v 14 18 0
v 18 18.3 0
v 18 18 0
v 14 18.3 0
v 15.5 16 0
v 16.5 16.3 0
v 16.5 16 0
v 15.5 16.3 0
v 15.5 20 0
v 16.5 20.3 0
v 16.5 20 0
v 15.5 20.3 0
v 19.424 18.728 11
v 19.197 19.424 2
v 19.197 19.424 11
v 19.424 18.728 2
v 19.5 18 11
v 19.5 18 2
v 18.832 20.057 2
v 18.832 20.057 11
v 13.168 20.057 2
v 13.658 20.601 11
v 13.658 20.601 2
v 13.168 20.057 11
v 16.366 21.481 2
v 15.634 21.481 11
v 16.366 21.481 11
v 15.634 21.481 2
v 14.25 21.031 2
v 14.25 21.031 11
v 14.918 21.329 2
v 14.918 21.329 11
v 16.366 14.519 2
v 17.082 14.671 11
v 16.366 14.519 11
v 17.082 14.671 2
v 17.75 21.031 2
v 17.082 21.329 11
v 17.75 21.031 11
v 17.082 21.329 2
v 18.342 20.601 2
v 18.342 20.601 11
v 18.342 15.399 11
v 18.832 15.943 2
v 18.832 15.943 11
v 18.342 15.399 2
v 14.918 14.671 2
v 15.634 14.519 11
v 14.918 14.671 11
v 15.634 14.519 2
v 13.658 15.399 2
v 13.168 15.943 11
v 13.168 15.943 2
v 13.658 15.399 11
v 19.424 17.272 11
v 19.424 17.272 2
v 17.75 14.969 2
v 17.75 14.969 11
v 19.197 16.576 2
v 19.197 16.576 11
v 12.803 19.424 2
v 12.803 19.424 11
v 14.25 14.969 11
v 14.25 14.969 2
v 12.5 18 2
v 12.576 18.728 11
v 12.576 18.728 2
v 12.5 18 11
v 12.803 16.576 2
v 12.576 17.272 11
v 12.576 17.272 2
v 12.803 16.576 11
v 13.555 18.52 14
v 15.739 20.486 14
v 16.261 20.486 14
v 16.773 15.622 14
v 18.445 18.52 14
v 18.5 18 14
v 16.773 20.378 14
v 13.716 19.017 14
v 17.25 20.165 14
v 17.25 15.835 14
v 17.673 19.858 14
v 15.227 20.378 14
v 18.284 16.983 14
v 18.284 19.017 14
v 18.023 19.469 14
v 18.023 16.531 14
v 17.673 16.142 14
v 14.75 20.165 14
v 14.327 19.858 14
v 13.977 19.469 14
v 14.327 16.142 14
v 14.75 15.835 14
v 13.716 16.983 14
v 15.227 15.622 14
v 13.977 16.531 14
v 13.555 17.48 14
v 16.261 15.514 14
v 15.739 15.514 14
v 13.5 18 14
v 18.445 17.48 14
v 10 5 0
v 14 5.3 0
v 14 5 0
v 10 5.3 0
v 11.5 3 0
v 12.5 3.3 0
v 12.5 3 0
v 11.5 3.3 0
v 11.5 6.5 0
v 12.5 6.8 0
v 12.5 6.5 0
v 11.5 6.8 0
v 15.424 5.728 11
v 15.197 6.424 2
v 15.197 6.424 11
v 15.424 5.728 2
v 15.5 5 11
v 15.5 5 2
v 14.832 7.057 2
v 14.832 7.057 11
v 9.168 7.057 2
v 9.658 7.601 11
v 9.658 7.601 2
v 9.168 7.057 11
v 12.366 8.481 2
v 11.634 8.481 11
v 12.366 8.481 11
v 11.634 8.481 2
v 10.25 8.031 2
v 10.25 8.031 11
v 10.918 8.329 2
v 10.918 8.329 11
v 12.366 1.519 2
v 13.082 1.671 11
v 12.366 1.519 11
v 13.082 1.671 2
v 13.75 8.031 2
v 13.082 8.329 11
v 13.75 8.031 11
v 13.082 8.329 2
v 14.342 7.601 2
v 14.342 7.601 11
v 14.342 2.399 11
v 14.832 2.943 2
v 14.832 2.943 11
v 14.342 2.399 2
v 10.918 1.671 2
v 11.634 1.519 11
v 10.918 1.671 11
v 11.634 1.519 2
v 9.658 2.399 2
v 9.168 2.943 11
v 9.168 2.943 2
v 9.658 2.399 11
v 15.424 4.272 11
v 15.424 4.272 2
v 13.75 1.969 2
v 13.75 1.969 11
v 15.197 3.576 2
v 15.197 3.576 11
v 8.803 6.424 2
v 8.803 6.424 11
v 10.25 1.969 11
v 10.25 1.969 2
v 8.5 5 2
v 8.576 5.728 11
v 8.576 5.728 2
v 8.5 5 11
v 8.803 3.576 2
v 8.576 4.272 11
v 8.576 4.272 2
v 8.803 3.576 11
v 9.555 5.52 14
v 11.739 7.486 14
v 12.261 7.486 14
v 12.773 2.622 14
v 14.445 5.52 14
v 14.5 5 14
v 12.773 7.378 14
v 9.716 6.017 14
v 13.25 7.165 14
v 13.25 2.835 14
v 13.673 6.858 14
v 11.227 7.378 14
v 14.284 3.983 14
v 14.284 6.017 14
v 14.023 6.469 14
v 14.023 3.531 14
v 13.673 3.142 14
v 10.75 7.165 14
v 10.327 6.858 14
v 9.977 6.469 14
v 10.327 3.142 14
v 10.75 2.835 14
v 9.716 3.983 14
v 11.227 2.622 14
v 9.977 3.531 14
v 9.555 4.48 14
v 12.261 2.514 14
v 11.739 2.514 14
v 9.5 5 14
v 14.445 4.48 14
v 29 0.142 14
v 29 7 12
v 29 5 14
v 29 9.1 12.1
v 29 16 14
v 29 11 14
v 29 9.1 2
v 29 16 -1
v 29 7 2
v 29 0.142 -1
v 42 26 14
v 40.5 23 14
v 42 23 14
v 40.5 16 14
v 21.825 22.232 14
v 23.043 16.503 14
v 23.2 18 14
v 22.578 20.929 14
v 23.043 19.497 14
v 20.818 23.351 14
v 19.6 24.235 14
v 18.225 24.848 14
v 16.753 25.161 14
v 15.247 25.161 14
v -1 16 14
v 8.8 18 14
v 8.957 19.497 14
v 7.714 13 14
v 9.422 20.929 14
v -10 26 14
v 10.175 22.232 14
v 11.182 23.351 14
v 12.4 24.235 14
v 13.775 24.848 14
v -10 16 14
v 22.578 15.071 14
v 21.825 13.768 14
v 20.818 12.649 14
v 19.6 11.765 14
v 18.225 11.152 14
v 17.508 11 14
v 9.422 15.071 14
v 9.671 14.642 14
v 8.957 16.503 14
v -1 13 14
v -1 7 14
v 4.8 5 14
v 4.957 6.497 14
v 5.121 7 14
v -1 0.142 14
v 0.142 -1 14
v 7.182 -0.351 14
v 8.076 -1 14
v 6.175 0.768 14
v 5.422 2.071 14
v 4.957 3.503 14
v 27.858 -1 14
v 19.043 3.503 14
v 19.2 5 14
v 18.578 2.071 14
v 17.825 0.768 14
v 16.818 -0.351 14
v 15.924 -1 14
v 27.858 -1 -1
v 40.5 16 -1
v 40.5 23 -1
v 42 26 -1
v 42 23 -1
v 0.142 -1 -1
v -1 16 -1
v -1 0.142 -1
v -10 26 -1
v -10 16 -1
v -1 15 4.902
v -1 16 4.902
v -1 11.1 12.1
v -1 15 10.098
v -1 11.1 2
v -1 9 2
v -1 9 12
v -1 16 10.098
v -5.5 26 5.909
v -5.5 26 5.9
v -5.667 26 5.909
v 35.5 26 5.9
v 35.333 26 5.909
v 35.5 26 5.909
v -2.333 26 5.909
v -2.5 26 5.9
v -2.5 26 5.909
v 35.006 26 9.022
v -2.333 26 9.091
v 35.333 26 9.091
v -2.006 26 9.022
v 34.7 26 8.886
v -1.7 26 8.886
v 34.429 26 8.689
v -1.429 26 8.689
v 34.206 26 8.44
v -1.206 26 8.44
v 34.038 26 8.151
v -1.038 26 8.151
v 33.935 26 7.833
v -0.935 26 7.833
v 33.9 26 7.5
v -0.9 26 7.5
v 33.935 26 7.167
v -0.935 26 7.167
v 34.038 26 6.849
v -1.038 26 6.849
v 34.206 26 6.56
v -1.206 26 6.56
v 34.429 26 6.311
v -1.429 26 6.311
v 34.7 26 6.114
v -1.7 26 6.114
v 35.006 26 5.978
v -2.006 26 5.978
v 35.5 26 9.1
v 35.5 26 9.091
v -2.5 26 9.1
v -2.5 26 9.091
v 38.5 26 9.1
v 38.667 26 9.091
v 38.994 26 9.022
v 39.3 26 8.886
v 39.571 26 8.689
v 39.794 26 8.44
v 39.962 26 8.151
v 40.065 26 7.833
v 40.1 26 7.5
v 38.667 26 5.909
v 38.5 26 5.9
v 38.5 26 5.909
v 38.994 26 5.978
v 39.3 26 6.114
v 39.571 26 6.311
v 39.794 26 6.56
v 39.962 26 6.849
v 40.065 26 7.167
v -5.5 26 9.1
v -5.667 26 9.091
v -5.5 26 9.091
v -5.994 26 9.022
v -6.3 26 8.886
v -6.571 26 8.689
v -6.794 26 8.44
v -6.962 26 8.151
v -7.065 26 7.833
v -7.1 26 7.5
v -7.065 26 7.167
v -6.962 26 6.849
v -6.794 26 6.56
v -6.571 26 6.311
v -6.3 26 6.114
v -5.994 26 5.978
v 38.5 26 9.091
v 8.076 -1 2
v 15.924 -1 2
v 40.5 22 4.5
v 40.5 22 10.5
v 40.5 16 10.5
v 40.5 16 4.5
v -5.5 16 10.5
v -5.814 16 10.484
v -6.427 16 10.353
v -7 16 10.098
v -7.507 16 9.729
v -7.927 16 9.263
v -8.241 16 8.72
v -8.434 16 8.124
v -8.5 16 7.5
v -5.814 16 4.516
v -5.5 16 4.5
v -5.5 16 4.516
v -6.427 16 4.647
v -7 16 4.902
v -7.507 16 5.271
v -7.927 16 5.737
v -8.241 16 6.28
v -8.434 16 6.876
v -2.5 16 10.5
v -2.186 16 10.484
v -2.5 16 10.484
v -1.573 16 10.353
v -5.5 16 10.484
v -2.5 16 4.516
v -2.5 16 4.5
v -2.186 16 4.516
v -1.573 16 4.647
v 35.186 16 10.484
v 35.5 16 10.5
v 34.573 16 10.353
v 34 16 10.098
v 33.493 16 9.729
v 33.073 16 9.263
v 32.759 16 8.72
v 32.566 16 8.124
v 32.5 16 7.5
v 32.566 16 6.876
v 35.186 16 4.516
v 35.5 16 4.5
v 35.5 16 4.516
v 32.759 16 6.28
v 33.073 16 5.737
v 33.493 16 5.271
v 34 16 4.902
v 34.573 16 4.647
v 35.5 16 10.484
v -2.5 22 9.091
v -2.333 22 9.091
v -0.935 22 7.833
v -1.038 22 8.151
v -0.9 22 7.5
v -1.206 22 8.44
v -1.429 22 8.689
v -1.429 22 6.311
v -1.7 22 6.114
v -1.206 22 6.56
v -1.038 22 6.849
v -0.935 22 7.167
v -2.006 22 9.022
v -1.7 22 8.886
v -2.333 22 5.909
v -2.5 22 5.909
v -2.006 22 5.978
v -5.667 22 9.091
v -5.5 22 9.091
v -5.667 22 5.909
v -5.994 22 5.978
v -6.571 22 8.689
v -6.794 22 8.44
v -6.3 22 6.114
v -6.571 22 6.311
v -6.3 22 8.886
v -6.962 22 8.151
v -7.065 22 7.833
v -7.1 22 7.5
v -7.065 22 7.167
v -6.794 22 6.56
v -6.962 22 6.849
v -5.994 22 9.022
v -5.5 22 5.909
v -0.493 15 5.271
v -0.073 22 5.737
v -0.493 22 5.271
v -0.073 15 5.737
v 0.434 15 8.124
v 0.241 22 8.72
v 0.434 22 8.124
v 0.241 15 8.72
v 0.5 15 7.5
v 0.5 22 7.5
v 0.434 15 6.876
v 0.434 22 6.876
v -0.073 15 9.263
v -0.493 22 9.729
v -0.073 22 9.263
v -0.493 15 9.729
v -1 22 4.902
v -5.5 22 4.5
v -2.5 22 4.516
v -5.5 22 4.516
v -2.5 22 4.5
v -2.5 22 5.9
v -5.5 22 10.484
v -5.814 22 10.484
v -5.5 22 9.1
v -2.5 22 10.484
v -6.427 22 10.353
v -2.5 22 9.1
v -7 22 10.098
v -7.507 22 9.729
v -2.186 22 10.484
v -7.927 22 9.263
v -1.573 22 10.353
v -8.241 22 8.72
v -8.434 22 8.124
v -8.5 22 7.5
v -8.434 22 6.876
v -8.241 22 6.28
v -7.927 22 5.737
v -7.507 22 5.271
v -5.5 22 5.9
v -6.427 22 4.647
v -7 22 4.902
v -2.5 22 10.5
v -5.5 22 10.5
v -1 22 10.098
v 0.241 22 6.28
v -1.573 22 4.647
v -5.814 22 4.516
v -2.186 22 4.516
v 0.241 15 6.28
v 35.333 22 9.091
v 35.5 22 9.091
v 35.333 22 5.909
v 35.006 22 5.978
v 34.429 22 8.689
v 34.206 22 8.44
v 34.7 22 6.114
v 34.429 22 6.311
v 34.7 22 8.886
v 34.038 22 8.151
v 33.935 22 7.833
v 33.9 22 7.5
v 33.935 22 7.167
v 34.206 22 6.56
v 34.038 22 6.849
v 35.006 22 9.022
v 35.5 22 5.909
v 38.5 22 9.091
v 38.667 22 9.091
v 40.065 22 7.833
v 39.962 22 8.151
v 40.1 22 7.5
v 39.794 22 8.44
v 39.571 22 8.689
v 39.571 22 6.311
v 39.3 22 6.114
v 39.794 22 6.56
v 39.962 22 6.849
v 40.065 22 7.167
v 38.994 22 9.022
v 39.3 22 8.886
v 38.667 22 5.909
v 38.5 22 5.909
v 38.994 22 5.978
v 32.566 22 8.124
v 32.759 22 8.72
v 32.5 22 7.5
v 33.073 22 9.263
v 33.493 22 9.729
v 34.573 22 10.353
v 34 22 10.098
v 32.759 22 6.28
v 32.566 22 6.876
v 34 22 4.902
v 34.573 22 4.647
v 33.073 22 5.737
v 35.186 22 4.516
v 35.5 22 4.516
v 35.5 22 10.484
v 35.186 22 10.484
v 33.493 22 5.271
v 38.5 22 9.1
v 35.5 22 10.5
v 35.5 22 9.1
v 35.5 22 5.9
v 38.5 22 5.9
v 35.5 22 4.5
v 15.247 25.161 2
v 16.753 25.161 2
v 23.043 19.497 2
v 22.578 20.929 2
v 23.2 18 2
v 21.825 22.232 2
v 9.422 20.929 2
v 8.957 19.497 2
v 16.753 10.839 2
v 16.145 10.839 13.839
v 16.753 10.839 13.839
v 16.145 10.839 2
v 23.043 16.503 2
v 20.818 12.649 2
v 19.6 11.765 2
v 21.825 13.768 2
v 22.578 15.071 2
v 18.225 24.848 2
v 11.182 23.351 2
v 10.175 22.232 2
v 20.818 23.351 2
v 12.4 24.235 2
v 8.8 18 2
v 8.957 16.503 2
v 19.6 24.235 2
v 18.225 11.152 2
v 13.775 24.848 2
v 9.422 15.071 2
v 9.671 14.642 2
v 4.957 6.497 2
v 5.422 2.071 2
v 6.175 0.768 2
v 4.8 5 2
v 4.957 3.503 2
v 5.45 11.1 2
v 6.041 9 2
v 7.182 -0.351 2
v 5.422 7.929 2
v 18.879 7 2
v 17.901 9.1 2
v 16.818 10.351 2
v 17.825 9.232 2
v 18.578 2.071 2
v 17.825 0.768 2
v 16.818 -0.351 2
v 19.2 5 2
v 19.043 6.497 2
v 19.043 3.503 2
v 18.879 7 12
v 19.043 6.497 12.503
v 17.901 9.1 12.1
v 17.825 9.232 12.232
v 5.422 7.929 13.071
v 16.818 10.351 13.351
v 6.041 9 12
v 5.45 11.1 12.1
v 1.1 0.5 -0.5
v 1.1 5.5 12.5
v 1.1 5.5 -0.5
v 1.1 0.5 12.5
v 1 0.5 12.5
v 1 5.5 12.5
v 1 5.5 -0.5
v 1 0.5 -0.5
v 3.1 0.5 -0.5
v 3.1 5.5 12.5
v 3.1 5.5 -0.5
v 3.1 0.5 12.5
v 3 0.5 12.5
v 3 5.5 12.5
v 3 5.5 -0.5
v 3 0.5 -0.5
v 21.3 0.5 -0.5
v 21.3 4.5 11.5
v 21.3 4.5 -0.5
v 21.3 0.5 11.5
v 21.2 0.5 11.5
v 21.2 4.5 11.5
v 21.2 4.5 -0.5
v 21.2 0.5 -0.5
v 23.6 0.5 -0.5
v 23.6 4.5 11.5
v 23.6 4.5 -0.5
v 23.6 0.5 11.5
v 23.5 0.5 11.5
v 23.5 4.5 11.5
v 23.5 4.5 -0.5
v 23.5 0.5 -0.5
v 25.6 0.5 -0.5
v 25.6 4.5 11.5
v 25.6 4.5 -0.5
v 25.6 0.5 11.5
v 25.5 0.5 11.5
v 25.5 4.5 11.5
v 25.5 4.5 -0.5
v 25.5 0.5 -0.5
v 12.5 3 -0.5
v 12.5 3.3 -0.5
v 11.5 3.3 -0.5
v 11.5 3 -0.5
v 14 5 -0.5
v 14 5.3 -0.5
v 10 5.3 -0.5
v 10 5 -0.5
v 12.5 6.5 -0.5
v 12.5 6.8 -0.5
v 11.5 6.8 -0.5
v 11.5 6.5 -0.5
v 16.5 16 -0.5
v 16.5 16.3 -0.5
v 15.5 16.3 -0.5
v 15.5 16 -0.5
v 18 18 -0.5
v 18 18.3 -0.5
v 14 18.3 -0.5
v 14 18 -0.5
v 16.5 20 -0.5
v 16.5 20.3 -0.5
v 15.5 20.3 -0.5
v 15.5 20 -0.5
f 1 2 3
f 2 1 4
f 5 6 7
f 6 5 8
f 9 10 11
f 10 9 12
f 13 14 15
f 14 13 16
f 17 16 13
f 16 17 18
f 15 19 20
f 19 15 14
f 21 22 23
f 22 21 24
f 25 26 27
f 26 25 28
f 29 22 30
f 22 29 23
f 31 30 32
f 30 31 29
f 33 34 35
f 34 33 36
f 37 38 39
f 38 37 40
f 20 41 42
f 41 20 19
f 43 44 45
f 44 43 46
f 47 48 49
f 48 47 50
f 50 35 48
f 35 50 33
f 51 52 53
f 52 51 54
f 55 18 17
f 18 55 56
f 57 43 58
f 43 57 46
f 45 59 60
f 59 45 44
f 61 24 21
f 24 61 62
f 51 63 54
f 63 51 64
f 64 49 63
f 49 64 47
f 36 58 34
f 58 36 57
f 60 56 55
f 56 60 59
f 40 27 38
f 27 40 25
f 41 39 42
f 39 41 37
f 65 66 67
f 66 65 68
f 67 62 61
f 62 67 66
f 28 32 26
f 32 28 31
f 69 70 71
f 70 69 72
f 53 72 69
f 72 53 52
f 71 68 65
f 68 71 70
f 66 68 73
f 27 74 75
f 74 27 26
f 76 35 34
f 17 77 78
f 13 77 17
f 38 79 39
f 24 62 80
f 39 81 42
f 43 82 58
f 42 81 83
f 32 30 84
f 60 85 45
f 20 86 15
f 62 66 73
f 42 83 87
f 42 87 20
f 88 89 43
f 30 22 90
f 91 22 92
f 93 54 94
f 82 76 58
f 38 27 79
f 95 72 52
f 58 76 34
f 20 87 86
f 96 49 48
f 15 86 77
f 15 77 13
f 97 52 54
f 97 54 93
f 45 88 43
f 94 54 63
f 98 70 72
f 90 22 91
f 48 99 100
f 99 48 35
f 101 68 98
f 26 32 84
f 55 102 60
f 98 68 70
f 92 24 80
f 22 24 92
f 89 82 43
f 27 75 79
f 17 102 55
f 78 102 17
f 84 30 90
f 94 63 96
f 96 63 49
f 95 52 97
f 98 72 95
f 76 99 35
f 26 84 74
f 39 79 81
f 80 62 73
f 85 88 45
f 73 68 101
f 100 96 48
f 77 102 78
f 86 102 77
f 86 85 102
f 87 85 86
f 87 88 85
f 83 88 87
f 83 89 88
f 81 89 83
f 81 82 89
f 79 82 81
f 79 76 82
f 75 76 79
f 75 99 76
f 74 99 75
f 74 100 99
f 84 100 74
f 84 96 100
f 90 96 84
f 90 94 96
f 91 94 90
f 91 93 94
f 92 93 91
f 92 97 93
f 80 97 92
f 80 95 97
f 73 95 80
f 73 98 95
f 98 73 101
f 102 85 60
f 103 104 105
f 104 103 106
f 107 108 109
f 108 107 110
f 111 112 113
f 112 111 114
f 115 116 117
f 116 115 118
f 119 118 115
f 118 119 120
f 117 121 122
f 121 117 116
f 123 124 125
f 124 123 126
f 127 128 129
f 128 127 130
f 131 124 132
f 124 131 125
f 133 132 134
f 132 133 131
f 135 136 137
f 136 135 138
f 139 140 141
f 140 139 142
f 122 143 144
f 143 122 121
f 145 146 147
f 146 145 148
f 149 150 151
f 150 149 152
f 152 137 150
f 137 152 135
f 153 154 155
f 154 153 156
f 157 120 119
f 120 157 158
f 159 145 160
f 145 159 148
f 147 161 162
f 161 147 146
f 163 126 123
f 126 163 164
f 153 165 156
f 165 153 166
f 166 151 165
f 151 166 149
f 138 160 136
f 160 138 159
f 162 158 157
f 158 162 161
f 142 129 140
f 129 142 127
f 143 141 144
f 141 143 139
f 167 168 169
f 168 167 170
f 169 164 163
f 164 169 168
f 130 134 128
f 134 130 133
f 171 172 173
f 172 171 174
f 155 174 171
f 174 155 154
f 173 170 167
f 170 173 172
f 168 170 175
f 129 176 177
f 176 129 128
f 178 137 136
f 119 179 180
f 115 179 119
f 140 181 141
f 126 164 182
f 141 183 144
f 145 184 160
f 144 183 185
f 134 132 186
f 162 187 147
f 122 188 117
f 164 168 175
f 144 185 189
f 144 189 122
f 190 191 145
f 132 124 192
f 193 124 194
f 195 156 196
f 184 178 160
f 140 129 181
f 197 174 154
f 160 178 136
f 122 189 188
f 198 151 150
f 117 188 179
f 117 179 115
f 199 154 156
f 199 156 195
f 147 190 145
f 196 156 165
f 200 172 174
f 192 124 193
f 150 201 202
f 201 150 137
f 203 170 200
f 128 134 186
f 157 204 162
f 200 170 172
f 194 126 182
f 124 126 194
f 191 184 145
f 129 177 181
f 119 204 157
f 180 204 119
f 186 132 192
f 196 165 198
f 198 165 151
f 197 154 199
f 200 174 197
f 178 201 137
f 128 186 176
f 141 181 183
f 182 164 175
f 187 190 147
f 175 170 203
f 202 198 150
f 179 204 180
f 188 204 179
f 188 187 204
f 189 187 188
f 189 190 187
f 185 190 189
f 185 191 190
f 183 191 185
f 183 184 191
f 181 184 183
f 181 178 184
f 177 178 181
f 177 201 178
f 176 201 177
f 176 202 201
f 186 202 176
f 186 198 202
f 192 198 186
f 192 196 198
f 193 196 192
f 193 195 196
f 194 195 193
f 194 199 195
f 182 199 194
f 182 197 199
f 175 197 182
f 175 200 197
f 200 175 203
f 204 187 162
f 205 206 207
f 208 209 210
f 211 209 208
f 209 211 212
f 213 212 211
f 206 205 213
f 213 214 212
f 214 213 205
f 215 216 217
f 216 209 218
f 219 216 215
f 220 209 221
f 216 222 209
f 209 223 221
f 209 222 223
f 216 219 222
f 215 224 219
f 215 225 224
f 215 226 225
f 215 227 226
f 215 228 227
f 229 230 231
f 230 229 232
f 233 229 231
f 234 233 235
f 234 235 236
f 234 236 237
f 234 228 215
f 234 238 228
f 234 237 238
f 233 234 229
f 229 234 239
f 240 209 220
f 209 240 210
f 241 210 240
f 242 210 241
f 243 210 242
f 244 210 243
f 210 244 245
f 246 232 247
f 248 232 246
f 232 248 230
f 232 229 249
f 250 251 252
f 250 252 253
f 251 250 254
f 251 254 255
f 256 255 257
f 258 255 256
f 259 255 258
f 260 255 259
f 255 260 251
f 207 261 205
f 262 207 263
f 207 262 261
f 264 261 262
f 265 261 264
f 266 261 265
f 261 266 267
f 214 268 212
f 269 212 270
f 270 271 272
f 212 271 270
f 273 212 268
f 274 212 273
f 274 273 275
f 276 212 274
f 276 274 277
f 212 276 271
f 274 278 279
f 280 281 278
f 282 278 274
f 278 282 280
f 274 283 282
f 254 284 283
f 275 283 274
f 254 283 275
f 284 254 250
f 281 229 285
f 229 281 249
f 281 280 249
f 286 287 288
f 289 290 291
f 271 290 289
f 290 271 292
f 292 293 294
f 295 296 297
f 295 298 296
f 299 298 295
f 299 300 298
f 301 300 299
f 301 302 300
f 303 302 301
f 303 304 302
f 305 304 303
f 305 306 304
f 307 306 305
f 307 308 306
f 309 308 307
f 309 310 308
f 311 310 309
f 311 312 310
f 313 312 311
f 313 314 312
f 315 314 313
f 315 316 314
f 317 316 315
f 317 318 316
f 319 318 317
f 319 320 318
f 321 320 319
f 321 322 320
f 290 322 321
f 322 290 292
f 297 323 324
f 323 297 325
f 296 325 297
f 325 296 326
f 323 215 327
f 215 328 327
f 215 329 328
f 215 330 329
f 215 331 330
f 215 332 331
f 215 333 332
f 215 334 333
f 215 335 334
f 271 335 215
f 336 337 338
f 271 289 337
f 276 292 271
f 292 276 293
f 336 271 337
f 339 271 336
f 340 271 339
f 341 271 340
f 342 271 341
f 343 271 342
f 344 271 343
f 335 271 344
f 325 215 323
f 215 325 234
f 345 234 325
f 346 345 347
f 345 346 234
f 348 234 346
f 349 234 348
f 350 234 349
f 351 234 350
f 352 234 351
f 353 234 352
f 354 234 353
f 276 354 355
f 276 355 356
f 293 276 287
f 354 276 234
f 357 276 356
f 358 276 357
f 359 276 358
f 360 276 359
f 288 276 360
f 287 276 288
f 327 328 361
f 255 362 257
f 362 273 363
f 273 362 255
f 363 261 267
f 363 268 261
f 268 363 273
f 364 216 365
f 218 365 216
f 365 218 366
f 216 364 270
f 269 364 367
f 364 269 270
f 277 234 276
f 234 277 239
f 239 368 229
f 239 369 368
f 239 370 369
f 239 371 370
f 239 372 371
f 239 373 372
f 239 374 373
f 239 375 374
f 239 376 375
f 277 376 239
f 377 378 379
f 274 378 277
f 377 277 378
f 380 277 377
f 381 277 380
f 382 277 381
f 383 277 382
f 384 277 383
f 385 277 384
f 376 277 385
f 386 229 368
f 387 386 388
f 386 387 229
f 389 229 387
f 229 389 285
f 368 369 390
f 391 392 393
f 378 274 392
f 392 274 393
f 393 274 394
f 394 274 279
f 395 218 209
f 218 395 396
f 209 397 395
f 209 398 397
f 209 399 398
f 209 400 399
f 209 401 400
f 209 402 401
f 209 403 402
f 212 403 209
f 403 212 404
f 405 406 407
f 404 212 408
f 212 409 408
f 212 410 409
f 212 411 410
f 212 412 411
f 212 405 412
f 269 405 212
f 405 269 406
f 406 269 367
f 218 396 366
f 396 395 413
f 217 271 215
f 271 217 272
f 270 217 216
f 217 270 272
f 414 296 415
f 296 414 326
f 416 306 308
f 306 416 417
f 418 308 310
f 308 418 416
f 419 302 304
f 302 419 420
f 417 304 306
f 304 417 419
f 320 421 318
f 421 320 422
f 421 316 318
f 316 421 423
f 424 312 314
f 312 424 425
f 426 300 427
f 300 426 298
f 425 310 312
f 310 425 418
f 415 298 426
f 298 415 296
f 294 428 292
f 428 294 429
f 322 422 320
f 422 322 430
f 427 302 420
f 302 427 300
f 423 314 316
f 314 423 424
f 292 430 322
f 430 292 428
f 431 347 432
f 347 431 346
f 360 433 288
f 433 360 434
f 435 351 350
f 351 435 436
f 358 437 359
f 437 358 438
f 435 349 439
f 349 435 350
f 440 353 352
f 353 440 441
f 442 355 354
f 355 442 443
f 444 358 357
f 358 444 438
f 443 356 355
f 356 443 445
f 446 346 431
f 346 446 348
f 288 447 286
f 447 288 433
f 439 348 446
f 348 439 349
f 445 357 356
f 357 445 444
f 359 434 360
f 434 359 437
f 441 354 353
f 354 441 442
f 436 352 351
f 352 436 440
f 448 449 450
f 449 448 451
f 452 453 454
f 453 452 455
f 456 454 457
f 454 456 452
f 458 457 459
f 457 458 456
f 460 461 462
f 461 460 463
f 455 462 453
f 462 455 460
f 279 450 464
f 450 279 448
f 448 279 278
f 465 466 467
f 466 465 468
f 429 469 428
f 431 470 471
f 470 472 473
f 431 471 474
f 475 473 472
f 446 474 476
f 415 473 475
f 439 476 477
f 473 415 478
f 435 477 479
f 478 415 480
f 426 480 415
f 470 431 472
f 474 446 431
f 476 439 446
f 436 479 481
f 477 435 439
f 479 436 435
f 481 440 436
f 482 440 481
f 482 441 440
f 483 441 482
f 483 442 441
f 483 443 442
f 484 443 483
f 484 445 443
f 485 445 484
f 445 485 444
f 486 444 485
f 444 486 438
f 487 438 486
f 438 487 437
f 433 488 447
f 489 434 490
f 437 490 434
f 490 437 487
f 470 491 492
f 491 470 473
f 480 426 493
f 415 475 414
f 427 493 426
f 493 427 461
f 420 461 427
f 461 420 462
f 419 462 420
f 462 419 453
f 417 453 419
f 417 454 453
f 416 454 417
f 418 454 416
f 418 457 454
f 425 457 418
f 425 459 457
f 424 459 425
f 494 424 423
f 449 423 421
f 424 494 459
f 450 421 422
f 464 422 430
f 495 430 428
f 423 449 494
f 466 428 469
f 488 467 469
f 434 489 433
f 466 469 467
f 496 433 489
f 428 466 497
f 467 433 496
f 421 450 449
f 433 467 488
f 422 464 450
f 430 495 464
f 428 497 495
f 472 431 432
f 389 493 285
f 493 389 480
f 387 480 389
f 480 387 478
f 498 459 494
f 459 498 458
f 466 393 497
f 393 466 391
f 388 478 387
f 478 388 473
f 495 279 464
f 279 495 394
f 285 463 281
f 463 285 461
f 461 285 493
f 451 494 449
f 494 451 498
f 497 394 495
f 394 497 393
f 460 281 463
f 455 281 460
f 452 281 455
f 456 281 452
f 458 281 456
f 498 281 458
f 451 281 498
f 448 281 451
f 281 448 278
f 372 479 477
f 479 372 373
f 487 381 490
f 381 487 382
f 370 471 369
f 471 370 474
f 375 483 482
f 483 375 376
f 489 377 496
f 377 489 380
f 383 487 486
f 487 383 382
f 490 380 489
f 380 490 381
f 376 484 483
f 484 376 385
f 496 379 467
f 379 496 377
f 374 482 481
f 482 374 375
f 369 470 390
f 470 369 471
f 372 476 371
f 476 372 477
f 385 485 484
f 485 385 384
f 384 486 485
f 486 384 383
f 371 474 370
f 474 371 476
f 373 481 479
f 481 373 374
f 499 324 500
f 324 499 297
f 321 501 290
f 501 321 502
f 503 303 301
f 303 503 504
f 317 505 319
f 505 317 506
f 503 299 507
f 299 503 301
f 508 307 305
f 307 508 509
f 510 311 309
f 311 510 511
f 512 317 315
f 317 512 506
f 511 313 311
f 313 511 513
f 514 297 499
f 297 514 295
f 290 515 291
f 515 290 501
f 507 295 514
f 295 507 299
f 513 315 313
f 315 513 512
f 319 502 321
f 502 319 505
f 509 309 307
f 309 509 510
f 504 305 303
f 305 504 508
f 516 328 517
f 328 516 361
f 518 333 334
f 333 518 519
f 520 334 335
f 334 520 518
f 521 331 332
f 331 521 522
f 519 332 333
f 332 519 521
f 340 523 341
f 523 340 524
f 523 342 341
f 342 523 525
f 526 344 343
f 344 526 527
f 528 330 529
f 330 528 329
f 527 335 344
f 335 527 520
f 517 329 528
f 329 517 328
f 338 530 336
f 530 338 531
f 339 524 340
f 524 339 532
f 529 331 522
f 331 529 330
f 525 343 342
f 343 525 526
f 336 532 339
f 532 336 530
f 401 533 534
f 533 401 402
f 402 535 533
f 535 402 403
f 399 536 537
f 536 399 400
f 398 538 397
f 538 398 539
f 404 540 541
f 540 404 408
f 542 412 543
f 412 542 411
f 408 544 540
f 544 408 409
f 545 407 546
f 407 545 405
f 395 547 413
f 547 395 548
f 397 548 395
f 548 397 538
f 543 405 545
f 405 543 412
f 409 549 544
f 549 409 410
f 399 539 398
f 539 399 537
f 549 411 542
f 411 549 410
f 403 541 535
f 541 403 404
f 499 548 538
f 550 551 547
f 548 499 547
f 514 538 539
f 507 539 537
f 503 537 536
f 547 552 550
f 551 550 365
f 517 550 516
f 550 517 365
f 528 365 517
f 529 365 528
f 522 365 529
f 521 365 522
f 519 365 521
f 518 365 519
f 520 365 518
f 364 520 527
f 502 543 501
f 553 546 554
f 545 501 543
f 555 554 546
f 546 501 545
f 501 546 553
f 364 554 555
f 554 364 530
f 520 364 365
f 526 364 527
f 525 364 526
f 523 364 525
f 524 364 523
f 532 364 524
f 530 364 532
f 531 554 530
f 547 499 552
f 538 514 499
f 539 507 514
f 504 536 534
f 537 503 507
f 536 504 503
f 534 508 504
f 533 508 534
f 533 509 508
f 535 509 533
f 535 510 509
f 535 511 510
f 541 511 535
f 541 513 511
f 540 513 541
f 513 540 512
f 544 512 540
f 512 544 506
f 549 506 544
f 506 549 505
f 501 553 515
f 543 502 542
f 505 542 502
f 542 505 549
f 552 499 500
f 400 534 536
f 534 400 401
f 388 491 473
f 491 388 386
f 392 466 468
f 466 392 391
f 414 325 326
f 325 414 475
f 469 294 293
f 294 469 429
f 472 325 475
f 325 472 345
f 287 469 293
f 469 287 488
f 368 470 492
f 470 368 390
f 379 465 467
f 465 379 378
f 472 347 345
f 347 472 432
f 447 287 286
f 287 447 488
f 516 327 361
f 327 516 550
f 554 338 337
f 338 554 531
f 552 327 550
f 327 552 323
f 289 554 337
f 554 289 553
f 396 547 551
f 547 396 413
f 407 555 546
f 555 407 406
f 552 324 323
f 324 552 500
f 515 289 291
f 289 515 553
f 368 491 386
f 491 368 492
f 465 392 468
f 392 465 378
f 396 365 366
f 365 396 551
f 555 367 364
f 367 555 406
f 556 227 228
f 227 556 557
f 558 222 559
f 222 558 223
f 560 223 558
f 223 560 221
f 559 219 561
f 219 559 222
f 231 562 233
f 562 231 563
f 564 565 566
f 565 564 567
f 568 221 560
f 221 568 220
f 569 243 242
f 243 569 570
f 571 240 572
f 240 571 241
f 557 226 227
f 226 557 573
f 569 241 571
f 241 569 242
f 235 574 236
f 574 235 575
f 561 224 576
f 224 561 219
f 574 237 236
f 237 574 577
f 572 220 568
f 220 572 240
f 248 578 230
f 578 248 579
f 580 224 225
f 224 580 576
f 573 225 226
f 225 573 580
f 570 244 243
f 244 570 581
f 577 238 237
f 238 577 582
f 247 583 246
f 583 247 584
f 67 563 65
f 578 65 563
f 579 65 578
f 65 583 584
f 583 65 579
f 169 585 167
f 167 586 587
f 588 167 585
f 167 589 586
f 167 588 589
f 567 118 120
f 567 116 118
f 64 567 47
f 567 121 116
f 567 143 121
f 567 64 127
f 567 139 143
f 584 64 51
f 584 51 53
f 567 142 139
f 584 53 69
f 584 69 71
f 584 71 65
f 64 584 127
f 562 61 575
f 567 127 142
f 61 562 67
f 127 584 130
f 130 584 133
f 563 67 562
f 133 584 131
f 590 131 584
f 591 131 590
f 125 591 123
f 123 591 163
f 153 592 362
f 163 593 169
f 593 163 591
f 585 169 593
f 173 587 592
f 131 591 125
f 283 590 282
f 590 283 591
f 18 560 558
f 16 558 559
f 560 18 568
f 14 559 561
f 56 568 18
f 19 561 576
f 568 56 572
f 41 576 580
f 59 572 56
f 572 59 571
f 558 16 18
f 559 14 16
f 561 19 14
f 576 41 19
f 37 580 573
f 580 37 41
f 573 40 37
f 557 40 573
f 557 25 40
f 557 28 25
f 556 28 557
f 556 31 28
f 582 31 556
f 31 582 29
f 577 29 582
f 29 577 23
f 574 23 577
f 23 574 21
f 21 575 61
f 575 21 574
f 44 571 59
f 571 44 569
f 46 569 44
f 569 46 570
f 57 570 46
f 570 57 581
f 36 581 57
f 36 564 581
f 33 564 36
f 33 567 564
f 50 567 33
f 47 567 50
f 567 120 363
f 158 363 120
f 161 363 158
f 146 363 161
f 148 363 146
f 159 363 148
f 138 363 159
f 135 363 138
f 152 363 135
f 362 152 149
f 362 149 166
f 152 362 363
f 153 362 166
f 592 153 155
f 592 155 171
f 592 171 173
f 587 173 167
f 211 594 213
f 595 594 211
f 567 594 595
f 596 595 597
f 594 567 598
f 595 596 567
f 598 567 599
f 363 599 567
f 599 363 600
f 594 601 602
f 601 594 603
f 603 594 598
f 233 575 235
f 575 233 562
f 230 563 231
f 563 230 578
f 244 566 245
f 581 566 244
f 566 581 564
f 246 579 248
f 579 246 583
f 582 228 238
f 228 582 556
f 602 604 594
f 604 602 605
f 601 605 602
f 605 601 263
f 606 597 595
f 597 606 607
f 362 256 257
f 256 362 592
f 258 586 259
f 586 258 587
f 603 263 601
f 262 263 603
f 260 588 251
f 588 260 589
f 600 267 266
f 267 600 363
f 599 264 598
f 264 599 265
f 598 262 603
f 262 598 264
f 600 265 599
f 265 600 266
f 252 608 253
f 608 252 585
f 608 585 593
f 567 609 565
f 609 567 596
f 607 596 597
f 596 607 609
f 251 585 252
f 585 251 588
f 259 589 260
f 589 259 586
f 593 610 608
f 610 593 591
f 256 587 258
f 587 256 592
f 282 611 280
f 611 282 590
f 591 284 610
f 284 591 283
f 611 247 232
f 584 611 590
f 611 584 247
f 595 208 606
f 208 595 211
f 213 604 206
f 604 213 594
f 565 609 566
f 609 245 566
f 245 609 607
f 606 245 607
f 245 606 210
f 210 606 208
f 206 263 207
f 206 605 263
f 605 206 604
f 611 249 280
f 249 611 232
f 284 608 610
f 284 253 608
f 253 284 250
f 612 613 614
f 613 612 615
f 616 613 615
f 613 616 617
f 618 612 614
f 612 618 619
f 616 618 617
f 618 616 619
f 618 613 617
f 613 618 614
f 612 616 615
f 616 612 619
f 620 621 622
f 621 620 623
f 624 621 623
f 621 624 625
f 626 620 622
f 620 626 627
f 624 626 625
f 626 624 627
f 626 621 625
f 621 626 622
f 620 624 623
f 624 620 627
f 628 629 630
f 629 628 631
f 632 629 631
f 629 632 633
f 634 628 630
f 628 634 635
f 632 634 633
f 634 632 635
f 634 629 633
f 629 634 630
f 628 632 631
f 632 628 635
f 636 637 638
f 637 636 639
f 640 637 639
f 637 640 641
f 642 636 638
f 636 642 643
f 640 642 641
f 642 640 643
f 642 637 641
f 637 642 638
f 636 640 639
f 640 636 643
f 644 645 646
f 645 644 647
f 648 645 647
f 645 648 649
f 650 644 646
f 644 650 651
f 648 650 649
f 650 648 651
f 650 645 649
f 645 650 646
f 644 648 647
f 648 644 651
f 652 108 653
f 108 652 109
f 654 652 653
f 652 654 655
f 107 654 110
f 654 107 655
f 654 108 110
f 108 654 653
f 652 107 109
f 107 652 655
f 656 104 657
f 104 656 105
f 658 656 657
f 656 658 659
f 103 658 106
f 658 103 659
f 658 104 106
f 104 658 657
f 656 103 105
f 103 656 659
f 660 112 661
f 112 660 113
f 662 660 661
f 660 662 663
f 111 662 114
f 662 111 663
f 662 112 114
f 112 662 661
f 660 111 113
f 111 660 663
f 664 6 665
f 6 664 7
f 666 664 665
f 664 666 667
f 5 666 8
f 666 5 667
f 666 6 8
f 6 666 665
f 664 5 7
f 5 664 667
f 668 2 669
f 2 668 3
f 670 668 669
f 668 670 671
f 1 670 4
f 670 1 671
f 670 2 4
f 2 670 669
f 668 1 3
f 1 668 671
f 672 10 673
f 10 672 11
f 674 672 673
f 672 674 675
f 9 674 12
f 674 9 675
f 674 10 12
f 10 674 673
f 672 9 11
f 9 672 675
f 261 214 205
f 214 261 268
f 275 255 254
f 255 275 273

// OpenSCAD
// PRUSA iteration3
// Y belt holder
// GNU GPL v3
// Josef Průša <iam@josefprusa.cz> and contributors
// http://www.reprap.org/wiki/Prusa_Mendel
// http://prusamendel.org

module main_body()
{
translate([-1, -1, -1 ]) cube([ 30, 27, 15 ]);
translate([-10, 16, -1 ]) cube([ 50.5, 10, 15 ]);
translate([-10, 23, -1 ]) cube([ 52, 3, 15 ]);
}

module belt_holders()
{
    
   translate([ 16, 18, 0 ]) cylinder( h=11, r=3.5, $fn=30 );  // upper belt holder
    translate([ 16, 18, 11 ]) cylinder( h=3, r1=3.5, r2=2.5, $fn=30 );  // upper belt holder cone
    
    translate([ 12, 5, 0 ]) cylinder( h=11, r=3.5, $fn=30 );  // lower belt holder
    translate([ 12, 5, 11 ]) cylinder( h=3 , r1=3.5, r2=2.5, $fn=30 );  // lower belt holder cone
}

module screws()
{
    translate( [ -2.5 , 28 , 7.5 ] ) rotate([90,0,0]) cylinder( h = 10, r = 1.6, $fn=30);  //screw hole
    translate( [ -5.5 , 28 , 7.5 ] ) rotate([90,0,0]) cylinder( h = 10, r = 1.6, $fn=30);  //screw hole
    translate( [ -2.5, 22 , 7.5 ] ) rotate([90,0,0]) cylinder( h = 7, r = 3, $fn=30);  //screw hole - head
    translate( [ -5.5 , 22 , 7.5 ] ) rotate([90,0,0]) cylinder( h = 10, r = 3, $fn=30);  //screw hole - head
    
    translate( [ 35.5 , 28 , 7.5 ] ) rotate([90,0,0]) cylinder( h = 10, r = 1.6, $fn=30);  //screw hole
    translate( [ 38.5 , 28 , 7.5 ] ) rotate([90,0,0]) cylinder( h = 10, r = 1.6, $fn=30);  //screw hole
    translate( [ 35.5 , 22 , 7.5 ] ) rotate([90,0,0]) cylinder( h = 10, r = 3, $fn=30);  //screw hole - head
    translate( [ 38.5 , 22 , 7.5 ] ) rotate([90,0,0]) cylinder( h = 10, r = 3, $fn=30);  //screw hole - head
    
    translate([-5.5, 21, 5.9 ]) cube([ 3, 6, 3.2 ]);
    translate([35.5, 21, 5.9 ]) cube([ 3, 6, 3.2 ]);
    
    translate([-5.5, 15, 4.5 ]) cube([ 3, 7, 6 ]);
    translate([35.5, 15, 4.5 ]) cube([ 6, 7, 6 ]);
}

belt_holders();

difference()
{
main_body();
    
translate([ 16, 18, 2 ]) cylinder( h = 16, r = 7.2, $fn=30 );  // upper belt space cutaway
translate([ 12, 5, 2 ]) cylinder( h = 16, r = 7.2, $fn=30 );  // lower belt space cutaway

translate([-20, 9, 2]) cube([ 28, 2.1, 16 ]); 
rotate([0,0,40]) translate([11, 1, 2 ]) cube([ 10, 4, 16 ]);     
    
translate([10, 7, 2 ]) cube([ 32, 2.1, 16 ]); 
    
translate([16, 8, 11 ]) rotate([45,0,0]) cube([ 15, 5, 5 ]);     
translate([-2, 10, 11 ]) rotate([45,0,0]) cube([ 10, 5, 5 ]);     

screws();
    


    // print part reinforcement
    translate([1,0.5,-0.5]) cube([0.1,5,13]);     
    translate([3,0.5,-0.5]) cube([0.1,5,13]);     
    translate([21.2,0.5,-0.5]) cube([0.1,4,12]);
    translate([23.5,0.5,-0.5]) cube([0.1,4,12]);
    translate([25.5,0.5,-0.5]) cube([0.1,4,12]);
    translate([11.5,3,-0.5]) cube([1,0.3,12]);
    translate([10,5,-0.5]) cube([4,0.3,12]);
    translate([11.5,6.5,-0.5]) cube([1,0.3,12]);
    translate([15.5,16,-0.5]) cube([1,0.3,12]);
    translate([14,18,-0.5]) cube([4,0.3,12]);
    translate([15.5,20,-0.5]) cube([1,0.3,12]);    
 
 
    // corner cutoff
    translate([30,-13,-2]) rotate([0,0,45]) cube([10,10,20]);    
    translate([-2,-13,-2]) rotate([0,0,45]) cube([10,10,20]);    
    
    
}
